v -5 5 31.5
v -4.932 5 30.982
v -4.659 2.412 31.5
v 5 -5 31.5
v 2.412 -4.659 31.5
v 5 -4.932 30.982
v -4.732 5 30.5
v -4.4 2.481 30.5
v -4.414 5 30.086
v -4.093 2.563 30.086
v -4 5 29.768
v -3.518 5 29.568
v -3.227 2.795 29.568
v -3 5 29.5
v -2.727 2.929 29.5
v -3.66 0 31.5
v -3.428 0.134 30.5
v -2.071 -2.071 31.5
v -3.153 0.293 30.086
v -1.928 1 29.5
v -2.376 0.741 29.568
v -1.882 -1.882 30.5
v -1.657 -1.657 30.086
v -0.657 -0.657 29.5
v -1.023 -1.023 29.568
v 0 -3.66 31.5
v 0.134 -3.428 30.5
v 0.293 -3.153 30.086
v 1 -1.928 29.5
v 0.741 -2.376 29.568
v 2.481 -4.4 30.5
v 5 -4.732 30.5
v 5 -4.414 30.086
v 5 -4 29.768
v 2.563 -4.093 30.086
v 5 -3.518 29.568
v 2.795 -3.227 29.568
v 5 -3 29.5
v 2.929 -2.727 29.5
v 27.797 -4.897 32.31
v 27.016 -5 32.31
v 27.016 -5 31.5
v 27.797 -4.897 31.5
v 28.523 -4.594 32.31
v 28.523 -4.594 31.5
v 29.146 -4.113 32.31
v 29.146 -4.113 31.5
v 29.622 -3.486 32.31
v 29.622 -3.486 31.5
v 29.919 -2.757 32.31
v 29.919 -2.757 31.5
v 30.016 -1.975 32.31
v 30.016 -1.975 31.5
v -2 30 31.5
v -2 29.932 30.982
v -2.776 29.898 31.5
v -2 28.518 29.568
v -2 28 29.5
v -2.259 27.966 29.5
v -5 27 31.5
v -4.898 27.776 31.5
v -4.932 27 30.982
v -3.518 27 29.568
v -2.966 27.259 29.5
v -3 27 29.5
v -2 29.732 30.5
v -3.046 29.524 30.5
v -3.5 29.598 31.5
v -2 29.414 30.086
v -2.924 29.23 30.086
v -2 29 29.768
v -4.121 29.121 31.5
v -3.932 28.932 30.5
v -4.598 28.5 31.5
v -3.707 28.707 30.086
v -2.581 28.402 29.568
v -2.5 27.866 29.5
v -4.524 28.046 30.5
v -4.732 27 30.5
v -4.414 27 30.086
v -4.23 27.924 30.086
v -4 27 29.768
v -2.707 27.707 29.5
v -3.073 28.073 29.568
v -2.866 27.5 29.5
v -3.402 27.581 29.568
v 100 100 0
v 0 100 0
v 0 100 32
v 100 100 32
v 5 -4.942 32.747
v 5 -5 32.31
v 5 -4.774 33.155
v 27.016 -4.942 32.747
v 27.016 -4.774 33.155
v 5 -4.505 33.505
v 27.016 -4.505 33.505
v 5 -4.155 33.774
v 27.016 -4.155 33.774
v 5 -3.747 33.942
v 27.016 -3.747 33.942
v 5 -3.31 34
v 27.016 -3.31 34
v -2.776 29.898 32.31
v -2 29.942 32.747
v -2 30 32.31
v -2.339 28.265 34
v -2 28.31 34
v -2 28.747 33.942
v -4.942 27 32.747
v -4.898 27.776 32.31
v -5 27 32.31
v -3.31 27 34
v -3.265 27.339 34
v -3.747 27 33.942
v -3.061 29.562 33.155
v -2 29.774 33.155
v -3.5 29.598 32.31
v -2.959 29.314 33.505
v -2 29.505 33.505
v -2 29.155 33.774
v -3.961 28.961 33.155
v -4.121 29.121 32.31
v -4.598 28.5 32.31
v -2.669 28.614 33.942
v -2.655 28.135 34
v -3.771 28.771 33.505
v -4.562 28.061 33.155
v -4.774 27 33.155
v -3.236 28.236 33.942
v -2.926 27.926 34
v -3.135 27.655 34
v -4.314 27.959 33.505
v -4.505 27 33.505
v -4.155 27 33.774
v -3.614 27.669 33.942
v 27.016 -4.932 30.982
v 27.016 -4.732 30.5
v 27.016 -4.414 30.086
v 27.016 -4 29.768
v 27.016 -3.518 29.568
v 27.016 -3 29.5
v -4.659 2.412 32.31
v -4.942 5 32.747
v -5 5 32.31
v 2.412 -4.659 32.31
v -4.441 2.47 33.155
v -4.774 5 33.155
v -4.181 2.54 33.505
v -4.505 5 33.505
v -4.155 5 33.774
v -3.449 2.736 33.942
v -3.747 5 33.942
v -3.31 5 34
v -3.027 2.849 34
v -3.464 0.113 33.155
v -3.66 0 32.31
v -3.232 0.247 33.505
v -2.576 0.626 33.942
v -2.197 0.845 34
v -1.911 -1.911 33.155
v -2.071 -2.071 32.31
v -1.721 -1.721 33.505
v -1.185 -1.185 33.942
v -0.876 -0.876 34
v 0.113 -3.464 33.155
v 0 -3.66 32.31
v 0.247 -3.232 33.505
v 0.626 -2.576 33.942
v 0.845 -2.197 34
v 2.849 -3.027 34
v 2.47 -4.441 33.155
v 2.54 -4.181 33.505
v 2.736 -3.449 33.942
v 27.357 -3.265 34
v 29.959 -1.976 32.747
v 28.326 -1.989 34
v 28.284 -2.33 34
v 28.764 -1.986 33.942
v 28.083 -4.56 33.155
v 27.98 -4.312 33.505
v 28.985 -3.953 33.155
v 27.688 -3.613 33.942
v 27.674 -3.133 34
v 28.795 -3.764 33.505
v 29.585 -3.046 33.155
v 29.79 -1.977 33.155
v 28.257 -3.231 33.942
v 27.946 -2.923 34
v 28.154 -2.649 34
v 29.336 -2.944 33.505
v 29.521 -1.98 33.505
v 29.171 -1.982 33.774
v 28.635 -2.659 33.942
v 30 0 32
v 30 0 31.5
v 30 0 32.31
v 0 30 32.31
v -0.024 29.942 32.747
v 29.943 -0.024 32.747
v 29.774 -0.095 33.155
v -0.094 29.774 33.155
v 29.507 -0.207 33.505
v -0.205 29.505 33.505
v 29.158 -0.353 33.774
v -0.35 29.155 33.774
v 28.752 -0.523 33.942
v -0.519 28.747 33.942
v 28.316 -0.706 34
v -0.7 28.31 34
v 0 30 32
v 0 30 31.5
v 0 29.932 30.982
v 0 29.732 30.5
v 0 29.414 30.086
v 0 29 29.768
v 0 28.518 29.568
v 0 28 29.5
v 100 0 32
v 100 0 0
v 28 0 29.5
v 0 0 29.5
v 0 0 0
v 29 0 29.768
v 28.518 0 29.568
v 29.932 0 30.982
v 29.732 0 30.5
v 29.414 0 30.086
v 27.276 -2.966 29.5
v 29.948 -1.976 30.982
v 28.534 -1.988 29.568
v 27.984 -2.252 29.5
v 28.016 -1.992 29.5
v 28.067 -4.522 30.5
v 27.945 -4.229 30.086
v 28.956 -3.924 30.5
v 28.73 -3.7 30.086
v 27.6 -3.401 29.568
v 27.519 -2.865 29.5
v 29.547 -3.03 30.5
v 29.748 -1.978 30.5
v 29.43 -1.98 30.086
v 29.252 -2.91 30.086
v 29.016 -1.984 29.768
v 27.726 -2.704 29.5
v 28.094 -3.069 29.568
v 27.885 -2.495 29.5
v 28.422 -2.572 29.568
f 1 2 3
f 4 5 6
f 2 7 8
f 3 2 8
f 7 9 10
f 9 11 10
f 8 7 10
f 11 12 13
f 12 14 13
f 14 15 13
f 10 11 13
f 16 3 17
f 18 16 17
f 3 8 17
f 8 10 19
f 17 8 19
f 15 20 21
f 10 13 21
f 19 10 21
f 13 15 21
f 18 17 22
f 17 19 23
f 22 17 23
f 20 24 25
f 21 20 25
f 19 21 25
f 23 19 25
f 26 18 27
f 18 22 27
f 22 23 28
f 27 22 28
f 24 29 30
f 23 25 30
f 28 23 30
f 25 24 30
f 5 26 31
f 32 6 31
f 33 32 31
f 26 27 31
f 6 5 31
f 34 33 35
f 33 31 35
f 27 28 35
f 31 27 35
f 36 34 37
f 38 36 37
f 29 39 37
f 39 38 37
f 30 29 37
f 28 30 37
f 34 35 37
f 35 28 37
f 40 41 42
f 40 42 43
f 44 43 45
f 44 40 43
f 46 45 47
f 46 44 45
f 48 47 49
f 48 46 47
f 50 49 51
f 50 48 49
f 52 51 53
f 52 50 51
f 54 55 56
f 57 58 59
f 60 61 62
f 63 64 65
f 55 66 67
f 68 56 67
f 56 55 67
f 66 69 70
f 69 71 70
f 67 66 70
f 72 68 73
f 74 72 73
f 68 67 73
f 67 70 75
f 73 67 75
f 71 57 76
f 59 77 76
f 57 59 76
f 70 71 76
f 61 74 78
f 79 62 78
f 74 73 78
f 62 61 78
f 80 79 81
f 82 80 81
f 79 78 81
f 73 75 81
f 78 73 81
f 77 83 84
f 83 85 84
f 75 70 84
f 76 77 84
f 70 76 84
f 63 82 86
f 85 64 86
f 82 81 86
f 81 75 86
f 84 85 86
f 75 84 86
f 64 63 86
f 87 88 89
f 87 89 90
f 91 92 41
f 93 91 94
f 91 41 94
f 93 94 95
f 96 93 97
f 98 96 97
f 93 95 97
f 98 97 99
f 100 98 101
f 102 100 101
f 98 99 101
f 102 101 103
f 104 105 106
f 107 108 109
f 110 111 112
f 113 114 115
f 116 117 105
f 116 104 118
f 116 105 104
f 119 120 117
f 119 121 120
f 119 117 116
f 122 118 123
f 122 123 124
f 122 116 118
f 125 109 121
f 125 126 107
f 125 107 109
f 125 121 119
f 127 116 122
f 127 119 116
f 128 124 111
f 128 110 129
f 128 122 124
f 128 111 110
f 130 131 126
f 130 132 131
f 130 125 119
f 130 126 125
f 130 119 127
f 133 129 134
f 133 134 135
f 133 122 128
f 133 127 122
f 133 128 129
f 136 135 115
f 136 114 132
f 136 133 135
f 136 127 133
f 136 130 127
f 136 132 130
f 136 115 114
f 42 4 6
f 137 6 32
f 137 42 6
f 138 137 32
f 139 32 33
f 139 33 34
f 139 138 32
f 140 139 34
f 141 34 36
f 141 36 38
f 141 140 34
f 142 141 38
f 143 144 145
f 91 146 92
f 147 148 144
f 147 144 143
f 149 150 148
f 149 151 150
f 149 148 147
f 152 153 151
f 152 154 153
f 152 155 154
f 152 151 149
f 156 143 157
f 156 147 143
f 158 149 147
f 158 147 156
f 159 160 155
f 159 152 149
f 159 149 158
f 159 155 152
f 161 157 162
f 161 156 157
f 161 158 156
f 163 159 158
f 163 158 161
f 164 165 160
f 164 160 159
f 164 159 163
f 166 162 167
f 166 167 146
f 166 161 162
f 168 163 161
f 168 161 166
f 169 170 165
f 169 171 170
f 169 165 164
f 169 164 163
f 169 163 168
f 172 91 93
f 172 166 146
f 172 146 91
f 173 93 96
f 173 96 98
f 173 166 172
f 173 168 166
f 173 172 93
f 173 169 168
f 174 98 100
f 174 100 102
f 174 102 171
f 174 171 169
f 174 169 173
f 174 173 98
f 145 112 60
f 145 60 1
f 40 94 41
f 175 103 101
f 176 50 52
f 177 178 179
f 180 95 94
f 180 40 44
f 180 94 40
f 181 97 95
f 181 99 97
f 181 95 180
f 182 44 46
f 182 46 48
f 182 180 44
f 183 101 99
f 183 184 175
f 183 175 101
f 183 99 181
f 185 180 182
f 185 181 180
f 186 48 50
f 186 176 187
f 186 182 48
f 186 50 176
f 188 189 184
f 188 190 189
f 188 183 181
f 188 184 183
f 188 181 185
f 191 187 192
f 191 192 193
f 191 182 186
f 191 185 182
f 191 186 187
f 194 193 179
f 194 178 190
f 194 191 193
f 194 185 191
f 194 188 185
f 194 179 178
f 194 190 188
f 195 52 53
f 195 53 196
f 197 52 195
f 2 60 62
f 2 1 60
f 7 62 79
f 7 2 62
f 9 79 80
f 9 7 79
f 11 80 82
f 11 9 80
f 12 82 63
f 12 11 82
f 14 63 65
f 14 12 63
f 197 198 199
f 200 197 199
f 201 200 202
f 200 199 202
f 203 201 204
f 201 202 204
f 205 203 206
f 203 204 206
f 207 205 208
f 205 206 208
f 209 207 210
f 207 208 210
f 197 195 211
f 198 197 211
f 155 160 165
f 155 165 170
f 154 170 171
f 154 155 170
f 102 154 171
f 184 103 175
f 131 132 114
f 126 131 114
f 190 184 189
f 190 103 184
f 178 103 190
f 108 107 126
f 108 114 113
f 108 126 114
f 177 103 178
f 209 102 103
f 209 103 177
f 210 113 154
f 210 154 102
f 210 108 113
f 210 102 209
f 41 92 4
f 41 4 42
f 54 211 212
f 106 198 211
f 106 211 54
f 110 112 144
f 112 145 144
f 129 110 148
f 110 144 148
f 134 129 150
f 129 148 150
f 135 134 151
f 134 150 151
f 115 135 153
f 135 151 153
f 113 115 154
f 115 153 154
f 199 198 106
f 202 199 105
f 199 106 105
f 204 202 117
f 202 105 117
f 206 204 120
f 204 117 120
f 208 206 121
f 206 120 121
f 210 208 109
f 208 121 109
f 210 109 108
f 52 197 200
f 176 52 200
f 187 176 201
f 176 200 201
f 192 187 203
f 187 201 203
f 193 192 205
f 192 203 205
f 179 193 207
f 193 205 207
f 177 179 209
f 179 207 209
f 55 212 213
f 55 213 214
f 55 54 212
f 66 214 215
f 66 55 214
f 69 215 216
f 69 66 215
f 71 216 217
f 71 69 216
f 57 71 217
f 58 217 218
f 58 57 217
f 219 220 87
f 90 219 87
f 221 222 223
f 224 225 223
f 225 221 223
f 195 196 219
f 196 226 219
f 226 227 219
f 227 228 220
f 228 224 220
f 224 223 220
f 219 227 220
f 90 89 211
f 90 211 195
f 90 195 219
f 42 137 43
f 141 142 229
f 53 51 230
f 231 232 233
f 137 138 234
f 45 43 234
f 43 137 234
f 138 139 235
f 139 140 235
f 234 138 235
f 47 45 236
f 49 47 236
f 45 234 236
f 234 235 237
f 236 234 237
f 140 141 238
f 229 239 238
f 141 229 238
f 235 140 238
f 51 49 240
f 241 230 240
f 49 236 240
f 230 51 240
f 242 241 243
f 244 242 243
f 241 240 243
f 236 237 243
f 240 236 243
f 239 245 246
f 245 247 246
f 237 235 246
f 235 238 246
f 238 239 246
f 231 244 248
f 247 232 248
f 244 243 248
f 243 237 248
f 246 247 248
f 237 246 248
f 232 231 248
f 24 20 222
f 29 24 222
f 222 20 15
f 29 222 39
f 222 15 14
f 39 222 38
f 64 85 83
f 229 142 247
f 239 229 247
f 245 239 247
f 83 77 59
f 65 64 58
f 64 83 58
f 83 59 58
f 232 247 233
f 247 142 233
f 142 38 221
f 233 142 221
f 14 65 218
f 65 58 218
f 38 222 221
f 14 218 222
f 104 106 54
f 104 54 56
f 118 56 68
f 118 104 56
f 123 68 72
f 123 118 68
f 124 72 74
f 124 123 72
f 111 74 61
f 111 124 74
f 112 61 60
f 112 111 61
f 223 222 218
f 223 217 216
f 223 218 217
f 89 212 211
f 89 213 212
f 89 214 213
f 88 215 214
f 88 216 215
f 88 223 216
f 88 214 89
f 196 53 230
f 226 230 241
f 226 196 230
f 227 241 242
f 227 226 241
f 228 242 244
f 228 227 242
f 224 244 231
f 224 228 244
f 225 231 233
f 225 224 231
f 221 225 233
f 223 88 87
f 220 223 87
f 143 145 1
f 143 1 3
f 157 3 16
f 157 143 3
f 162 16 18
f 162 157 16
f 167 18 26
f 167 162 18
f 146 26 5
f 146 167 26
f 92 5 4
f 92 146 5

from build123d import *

# Parameters (mm, degrees)
F0_W     = 100
F0_H     = 100
F1_DEPTH = 32
F3_DEPTH = 2
F4_DEPTH = 2.5
F5_R     = 2
F6_R     = 1.689949


with BuildPart() as f1:
    # F0 (on Top) → F1 (new body)
    with BuildSketch(Plane.XY):
        with Locations((50, 50)):
            Rectangle(F0_W, F0_H)
    extrude(amount=F1_DEPTH)



with BuildPart() as f3:
    # F2 (on face) → F3 (new body)
    with BuildSketch(Plane.XY.offset(32)):
        Polygon((0, 30), (0, 0), (30, 0), align=None)
        with BuildLine():
            Line((30, 0), (0, 0))
            Line((0, 0), (0, 30))
            Line((0, 30), (-2, 30))
            ThreePointArc((-2, 30), (-4.12132, 29.12132), (-5, 27))
            Line((-5, 27), (-5, 5))
            ThreePointArc((-5, 5), (-2.071068, -2.071068), (5, -5))
            Line((5, -5), (27.016253, -5))
            ThreePointArc((27.016253, -5), (29.146228, -4.11263), (30.016152, -1.975471))
            Line((30.016152, -1.975471), (30, 0))
        make_face()
    extrude(amount=F3_DEPTH)


with BuildPart() as f1_1:
    add(f1.part)

    add(f3.part)  # F4 merges F3
    # F2 (on face) → F4 (join)
    with BuildSketch(Plane.XY.offset(32)):
        with BuildLine():
            Line((30, 0), (0, 0))
            Line((0, 0), (0, 30))
            Line((0, 30), (-2, 30))
            ThreePointArc((-2, 30), (-4.12132, 29.12132), (-5, 27))
            Line((-5, 27), (-5, 5))
            ThreePointArc((-5, 5), (-2.071068, -2.071068), (5, -5))
            Line((5, -5), (27.016253, -5))
            ThreePointArc((27.016253, -5), (29.146228, -4.11263), (30.016152, -1.975471))
            Line((30.016152, -1.975471), (30, 0))
        make_face()
    extrude(amount=-F4_DEPTH)

    # F5
    f5_edges = [f1_1.edges().sort_by_distance(p)[0] for p in [
        (-1, 30, 29.5),
        (-4.12132, 29.12132, 29.5),
        (-5, 16, 29.5),
        (-2.071068, -2.071068, 29.5),
        (16.008126, -5, 29.5),
        (29.146228, -4.11263, 29.5),
        (30.008076, -0.987736, 29.5),
    ]]
    fillet(f5_edges, radius=F5_R)

    # F6
    f6_edges = [f1_1.edges().sort_by_distance(p)[0] for p in [
        (15, 15, 34),
        (-1, 30, 34),
        (-4.12132, 29.12132, 34),
        (-5, 16, 34),
        (-2.071068, -2.071068, 34),
        (16.008126, -5, 34),
        (29.146228, -4.11263, 34),
        (30.008076, -0.987736, 34),
    ]]
    fillet(f6_edges, radius=F6_R)


solid = f1_1.part
